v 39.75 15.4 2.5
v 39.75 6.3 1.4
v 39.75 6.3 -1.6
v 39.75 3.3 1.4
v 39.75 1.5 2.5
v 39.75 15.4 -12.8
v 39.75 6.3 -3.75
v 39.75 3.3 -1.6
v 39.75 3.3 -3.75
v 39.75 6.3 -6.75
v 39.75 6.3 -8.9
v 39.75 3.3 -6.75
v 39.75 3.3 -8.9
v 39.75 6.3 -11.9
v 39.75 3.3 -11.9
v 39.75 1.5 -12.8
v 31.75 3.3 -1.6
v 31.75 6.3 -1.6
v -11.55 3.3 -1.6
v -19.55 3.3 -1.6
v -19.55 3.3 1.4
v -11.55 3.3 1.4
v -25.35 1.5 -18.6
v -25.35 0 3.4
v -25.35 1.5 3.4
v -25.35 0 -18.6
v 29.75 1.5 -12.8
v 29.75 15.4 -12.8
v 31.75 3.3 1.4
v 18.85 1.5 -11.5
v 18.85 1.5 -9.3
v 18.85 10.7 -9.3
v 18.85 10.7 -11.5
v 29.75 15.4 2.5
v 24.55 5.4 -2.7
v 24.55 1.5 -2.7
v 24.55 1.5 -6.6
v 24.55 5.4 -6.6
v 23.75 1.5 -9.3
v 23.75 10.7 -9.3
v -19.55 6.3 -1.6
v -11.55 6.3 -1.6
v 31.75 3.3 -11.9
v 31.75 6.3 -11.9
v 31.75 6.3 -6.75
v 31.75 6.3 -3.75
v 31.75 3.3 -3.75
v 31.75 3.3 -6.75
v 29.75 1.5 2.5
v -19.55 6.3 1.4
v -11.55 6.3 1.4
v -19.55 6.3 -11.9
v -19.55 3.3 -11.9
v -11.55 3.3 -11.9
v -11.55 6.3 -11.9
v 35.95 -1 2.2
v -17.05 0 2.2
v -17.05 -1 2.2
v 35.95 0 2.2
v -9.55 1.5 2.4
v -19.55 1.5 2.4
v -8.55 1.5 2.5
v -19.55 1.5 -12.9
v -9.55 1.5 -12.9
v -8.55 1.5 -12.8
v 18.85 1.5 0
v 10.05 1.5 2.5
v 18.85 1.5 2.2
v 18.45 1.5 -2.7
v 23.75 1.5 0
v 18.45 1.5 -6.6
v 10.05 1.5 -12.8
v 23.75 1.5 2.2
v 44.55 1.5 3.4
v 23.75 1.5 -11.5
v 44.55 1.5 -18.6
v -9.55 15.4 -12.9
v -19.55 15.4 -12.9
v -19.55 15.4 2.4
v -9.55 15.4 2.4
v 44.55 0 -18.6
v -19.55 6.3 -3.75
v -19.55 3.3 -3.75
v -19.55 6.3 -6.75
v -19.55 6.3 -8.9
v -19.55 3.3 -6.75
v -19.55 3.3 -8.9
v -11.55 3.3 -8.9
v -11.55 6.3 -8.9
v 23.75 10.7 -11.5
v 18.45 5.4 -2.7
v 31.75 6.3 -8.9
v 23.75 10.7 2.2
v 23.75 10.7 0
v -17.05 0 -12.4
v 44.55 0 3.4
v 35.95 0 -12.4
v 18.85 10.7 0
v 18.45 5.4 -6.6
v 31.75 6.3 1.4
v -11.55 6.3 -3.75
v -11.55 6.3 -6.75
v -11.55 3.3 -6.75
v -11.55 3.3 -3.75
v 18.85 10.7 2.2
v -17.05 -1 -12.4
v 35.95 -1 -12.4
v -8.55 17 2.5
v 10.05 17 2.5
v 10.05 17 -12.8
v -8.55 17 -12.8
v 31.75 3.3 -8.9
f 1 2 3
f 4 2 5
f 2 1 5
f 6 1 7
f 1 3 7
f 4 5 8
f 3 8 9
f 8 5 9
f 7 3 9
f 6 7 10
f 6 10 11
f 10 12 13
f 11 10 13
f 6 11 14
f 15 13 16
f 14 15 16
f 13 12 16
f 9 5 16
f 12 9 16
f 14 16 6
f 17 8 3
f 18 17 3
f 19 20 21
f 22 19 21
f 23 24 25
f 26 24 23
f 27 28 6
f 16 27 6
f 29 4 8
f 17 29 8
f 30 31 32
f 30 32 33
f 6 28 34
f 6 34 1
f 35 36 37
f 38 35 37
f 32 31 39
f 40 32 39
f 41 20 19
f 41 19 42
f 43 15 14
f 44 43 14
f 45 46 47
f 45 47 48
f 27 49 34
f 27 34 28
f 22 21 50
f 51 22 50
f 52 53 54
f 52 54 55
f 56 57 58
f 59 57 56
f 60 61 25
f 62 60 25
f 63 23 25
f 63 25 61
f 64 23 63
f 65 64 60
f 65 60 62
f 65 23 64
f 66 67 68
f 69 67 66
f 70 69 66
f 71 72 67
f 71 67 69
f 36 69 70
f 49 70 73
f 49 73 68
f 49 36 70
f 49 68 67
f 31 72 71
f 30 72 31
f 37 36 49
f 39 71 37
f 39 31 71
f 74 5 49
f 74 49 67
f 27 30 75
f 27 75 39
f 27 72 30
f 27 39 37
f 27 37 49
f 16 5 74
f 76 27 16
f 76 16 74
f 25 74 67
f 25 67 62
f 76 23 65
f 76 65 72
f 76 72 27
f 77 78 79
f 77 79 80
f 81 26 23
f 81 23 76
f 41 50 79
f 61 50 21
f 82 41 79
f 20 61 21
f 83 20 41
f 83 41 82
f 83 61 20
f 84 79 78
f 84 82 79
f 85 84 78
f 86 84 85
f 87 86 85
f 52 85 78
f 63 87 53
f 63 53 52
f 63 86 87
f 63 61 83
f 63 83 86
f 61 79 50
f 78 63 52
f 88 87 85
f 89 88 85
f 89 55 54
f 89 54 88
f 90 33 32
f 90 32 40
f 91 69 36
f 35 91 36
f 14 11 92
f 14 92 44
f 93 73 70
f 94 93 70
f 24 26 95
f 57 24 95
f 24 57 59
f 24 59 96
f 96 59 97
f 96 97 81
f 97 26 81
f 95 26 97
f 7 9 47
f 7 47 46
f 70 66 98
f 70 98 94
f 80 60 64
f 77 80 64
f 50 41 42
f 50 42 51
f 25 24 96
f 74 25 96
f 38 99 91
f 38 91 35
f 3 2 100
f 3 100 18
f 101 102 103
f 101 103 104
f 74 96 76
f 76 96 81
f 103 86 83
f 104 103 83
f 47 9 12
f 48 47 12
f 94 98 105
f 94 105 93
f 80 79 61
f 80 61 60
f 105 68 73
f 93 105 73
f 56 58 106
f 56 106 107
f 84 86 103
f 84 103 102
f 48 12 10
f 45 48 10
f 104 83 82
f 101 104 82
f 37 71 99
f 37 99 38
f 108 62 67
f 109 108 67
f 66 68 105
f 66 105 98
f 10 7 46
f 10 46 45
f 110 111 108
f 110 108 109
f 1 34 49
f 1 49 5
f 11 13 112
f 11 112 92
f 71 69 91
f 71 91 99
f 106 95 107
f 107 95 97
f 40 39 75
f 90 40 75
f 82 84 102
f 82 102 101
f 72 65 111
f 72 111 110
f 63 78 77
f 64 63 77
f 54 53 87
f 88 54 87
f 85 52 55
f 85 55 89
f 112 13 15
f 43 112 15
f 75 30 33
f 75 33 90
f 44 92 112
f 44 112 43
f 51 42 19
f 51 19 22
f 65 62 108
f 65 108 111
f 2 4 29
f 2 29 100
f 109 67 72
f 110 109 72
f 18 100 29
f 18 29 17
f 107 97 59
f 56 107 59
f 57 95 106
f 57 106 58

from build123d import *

# Parameters (mm, degrees)
SKETCH1_W           = 69.9
SKETCH1_H           = 22
BOSS_EXTRUDE1_DEPTH = 1.5
BOSS_EXTRUDE2_START = -1.5
SKETCH2_W           = 10
SKETCH2_H           = 15.3
BOSS_EXTRUDE2_DEPTH = 15.4
BOSS_EXTRUDE3_START = -1.5
SKETCH2_3_W         = 18.6
SKETCH2_3_H         = 15.3
BOSS_EXTRUDE3_DEPTH = 17
SKETCH3_W           = 3
SKETCH3_H           = 3
CUT_EXTRUDE1_DEPTH  = 8
SKETCH4_W           = 3
SKETCH4_H           = 3
CUT_EXTRUDE2_DEPTH  = 8
BOSS_EXTRUDE5_START = -1.5
SKETCH5_W           = 4.9
SKETCH5_H           = 2.2
BOSS_EXTRUDE5_DEPTH = 10.7
BOSS_EXTRUDE6_START = -1.5
SKETCH5_3_W         = 6.1
SKETCH5_3_H         = 3.9
BOSS_EXTRUDE6_DEPTH = 5.4
SKETCH6_W           = 53
SKETCH6_H           = 14.6
BOSS_EXTRUDE7_DEPTH = 1


with BuildPart() as part:
    # Sketch1 → Boss-Extrude1 (new body)
    with BuildSketch(Plane(origin=(0, 0, 0), x_dir=(1, 0, 0), z_dir=(0, 1, 0))):
        with Locations((9.6, 7.6)):
            Rectangle(SKETCH1_W, SKETCH1_H)
    extrude(amount=BOSS_EXTRUDE1_DEPTH)

    # Sketch2 → Boss-Extrude2 (add)
    with BuildSketch(Plane(origin=(0, 1.5, 0), x_dir=(1, 0, 0), z_dir=(0, 1, 0)).offset(BOSS_EXTRUDE2_START)):
        with Locations((-14.55, 5.25)):
            Rectangle(SKETCH2_W, SKETCH2_H)
        with Locations((34.75, 5.15)):
            Rectangle(SKETCH2_W, SKETCH2_H)
    extrude(amount=BOSS_EXTRUDE2_DEPTH)

    # Sketch2<3> → Boss-Extrude3 (add)
    with BuildSketch(Plane(origin=(0, 1.5, 0), x_dir=(1, 0, 0), z_dir=(0, 1, 0)).offset(BOSS_EXTRUDE3_START)):
        with Locations((0.75, 5.15)):
            Rectangle(SKETCH2_3_W, SKETCH2_3_H)
    extrude(amount=BOSS_EXTRUDE3_DEPTH)

    # Sketch3 → Cut-Extrude1 (cut)
    with BuildSketch(Plane.ZY.offset(19.55)):
        with Locations((-10.4, 4.8)):
            Rectangle(SKETCH3_W, SKETCH3_H)
        with Locations((-5.25, 4.8)):
            Rectangle(SKETCH3_W, SKETCH3_H)
        with Locations((-0.1, 4.8)):
            Rectangle(SKETCH3_W, SKETCH3_H)
    extrude(amount=-CUT_EXTRUDE1_DEPTH, mode=Mode.SUBTRACT)

    # Sketch4 → Cut-Extrude2 (cut)
    with BuildSketch(Plane(origin=(39.75, 0, 0), x_dir=(0, 0, -1), z_dir=(1, 0, 0))):
        with Locations((10.4, 4.8)):
            Rectangle(SKETCH4_W, SKETCH4_H)
        with Locations((5.25, 4.8)):
            Rectangle(SKETCH4_W, SKETCH4_H)
        with Locations((0.1, 4.8)):
            Rectangle(SKETCH4_W, SKETCH4_H)
    extrude(amount=-CUT_EXTRUDE2_DEPTH, mode=Mode.SUBTRACT)

    # Sketch5 → Boss-Extrude5 (add)
    with BuildSketch(Plane(origin=(0, 1.5, 0), x_dir=(1, 0, 0), z_dir=(0, 1, 0)).offset(BOSS_EXTRUDE5_START)):
        with Locations((21.3, 10.4)):
            Rectangle(SKETCH5_W, SKETCH5_H)
        with Locations((21.3, -1.1)):
            Rectangle(SKETCH5_W, SKETCH5_H)
    extrude(amount=BOSS_EXTRUDE5_DEPTH)

    # Sketch5<3> → Boss-Extrude6 (add)
    with BuildSketch(Plane(origin=(0, 1.5, 0), x_dir=(1, 0, 0), z_dir=(0, 1, 0)).offset(BOSS_EXTRUDE6_START)):
        with Locations((21.5, 4.65)):
            Rectangle(SKETCH5_3_W, SKETCH5_3_H)
    extrude(amount=BOSS_EXTRUDE6_DEPTH)

    # Sketch6 → Boss-Extrude7 (add)
    with BuildSketch(Plane.XZ):
        with Locations((9.45, -5.1)):
            Rectangle(SKETCH6_W, SKETCH6_H)
    extrude(amount=BOSS_EXTRUDE7_DEPTH)


solid = part.part
